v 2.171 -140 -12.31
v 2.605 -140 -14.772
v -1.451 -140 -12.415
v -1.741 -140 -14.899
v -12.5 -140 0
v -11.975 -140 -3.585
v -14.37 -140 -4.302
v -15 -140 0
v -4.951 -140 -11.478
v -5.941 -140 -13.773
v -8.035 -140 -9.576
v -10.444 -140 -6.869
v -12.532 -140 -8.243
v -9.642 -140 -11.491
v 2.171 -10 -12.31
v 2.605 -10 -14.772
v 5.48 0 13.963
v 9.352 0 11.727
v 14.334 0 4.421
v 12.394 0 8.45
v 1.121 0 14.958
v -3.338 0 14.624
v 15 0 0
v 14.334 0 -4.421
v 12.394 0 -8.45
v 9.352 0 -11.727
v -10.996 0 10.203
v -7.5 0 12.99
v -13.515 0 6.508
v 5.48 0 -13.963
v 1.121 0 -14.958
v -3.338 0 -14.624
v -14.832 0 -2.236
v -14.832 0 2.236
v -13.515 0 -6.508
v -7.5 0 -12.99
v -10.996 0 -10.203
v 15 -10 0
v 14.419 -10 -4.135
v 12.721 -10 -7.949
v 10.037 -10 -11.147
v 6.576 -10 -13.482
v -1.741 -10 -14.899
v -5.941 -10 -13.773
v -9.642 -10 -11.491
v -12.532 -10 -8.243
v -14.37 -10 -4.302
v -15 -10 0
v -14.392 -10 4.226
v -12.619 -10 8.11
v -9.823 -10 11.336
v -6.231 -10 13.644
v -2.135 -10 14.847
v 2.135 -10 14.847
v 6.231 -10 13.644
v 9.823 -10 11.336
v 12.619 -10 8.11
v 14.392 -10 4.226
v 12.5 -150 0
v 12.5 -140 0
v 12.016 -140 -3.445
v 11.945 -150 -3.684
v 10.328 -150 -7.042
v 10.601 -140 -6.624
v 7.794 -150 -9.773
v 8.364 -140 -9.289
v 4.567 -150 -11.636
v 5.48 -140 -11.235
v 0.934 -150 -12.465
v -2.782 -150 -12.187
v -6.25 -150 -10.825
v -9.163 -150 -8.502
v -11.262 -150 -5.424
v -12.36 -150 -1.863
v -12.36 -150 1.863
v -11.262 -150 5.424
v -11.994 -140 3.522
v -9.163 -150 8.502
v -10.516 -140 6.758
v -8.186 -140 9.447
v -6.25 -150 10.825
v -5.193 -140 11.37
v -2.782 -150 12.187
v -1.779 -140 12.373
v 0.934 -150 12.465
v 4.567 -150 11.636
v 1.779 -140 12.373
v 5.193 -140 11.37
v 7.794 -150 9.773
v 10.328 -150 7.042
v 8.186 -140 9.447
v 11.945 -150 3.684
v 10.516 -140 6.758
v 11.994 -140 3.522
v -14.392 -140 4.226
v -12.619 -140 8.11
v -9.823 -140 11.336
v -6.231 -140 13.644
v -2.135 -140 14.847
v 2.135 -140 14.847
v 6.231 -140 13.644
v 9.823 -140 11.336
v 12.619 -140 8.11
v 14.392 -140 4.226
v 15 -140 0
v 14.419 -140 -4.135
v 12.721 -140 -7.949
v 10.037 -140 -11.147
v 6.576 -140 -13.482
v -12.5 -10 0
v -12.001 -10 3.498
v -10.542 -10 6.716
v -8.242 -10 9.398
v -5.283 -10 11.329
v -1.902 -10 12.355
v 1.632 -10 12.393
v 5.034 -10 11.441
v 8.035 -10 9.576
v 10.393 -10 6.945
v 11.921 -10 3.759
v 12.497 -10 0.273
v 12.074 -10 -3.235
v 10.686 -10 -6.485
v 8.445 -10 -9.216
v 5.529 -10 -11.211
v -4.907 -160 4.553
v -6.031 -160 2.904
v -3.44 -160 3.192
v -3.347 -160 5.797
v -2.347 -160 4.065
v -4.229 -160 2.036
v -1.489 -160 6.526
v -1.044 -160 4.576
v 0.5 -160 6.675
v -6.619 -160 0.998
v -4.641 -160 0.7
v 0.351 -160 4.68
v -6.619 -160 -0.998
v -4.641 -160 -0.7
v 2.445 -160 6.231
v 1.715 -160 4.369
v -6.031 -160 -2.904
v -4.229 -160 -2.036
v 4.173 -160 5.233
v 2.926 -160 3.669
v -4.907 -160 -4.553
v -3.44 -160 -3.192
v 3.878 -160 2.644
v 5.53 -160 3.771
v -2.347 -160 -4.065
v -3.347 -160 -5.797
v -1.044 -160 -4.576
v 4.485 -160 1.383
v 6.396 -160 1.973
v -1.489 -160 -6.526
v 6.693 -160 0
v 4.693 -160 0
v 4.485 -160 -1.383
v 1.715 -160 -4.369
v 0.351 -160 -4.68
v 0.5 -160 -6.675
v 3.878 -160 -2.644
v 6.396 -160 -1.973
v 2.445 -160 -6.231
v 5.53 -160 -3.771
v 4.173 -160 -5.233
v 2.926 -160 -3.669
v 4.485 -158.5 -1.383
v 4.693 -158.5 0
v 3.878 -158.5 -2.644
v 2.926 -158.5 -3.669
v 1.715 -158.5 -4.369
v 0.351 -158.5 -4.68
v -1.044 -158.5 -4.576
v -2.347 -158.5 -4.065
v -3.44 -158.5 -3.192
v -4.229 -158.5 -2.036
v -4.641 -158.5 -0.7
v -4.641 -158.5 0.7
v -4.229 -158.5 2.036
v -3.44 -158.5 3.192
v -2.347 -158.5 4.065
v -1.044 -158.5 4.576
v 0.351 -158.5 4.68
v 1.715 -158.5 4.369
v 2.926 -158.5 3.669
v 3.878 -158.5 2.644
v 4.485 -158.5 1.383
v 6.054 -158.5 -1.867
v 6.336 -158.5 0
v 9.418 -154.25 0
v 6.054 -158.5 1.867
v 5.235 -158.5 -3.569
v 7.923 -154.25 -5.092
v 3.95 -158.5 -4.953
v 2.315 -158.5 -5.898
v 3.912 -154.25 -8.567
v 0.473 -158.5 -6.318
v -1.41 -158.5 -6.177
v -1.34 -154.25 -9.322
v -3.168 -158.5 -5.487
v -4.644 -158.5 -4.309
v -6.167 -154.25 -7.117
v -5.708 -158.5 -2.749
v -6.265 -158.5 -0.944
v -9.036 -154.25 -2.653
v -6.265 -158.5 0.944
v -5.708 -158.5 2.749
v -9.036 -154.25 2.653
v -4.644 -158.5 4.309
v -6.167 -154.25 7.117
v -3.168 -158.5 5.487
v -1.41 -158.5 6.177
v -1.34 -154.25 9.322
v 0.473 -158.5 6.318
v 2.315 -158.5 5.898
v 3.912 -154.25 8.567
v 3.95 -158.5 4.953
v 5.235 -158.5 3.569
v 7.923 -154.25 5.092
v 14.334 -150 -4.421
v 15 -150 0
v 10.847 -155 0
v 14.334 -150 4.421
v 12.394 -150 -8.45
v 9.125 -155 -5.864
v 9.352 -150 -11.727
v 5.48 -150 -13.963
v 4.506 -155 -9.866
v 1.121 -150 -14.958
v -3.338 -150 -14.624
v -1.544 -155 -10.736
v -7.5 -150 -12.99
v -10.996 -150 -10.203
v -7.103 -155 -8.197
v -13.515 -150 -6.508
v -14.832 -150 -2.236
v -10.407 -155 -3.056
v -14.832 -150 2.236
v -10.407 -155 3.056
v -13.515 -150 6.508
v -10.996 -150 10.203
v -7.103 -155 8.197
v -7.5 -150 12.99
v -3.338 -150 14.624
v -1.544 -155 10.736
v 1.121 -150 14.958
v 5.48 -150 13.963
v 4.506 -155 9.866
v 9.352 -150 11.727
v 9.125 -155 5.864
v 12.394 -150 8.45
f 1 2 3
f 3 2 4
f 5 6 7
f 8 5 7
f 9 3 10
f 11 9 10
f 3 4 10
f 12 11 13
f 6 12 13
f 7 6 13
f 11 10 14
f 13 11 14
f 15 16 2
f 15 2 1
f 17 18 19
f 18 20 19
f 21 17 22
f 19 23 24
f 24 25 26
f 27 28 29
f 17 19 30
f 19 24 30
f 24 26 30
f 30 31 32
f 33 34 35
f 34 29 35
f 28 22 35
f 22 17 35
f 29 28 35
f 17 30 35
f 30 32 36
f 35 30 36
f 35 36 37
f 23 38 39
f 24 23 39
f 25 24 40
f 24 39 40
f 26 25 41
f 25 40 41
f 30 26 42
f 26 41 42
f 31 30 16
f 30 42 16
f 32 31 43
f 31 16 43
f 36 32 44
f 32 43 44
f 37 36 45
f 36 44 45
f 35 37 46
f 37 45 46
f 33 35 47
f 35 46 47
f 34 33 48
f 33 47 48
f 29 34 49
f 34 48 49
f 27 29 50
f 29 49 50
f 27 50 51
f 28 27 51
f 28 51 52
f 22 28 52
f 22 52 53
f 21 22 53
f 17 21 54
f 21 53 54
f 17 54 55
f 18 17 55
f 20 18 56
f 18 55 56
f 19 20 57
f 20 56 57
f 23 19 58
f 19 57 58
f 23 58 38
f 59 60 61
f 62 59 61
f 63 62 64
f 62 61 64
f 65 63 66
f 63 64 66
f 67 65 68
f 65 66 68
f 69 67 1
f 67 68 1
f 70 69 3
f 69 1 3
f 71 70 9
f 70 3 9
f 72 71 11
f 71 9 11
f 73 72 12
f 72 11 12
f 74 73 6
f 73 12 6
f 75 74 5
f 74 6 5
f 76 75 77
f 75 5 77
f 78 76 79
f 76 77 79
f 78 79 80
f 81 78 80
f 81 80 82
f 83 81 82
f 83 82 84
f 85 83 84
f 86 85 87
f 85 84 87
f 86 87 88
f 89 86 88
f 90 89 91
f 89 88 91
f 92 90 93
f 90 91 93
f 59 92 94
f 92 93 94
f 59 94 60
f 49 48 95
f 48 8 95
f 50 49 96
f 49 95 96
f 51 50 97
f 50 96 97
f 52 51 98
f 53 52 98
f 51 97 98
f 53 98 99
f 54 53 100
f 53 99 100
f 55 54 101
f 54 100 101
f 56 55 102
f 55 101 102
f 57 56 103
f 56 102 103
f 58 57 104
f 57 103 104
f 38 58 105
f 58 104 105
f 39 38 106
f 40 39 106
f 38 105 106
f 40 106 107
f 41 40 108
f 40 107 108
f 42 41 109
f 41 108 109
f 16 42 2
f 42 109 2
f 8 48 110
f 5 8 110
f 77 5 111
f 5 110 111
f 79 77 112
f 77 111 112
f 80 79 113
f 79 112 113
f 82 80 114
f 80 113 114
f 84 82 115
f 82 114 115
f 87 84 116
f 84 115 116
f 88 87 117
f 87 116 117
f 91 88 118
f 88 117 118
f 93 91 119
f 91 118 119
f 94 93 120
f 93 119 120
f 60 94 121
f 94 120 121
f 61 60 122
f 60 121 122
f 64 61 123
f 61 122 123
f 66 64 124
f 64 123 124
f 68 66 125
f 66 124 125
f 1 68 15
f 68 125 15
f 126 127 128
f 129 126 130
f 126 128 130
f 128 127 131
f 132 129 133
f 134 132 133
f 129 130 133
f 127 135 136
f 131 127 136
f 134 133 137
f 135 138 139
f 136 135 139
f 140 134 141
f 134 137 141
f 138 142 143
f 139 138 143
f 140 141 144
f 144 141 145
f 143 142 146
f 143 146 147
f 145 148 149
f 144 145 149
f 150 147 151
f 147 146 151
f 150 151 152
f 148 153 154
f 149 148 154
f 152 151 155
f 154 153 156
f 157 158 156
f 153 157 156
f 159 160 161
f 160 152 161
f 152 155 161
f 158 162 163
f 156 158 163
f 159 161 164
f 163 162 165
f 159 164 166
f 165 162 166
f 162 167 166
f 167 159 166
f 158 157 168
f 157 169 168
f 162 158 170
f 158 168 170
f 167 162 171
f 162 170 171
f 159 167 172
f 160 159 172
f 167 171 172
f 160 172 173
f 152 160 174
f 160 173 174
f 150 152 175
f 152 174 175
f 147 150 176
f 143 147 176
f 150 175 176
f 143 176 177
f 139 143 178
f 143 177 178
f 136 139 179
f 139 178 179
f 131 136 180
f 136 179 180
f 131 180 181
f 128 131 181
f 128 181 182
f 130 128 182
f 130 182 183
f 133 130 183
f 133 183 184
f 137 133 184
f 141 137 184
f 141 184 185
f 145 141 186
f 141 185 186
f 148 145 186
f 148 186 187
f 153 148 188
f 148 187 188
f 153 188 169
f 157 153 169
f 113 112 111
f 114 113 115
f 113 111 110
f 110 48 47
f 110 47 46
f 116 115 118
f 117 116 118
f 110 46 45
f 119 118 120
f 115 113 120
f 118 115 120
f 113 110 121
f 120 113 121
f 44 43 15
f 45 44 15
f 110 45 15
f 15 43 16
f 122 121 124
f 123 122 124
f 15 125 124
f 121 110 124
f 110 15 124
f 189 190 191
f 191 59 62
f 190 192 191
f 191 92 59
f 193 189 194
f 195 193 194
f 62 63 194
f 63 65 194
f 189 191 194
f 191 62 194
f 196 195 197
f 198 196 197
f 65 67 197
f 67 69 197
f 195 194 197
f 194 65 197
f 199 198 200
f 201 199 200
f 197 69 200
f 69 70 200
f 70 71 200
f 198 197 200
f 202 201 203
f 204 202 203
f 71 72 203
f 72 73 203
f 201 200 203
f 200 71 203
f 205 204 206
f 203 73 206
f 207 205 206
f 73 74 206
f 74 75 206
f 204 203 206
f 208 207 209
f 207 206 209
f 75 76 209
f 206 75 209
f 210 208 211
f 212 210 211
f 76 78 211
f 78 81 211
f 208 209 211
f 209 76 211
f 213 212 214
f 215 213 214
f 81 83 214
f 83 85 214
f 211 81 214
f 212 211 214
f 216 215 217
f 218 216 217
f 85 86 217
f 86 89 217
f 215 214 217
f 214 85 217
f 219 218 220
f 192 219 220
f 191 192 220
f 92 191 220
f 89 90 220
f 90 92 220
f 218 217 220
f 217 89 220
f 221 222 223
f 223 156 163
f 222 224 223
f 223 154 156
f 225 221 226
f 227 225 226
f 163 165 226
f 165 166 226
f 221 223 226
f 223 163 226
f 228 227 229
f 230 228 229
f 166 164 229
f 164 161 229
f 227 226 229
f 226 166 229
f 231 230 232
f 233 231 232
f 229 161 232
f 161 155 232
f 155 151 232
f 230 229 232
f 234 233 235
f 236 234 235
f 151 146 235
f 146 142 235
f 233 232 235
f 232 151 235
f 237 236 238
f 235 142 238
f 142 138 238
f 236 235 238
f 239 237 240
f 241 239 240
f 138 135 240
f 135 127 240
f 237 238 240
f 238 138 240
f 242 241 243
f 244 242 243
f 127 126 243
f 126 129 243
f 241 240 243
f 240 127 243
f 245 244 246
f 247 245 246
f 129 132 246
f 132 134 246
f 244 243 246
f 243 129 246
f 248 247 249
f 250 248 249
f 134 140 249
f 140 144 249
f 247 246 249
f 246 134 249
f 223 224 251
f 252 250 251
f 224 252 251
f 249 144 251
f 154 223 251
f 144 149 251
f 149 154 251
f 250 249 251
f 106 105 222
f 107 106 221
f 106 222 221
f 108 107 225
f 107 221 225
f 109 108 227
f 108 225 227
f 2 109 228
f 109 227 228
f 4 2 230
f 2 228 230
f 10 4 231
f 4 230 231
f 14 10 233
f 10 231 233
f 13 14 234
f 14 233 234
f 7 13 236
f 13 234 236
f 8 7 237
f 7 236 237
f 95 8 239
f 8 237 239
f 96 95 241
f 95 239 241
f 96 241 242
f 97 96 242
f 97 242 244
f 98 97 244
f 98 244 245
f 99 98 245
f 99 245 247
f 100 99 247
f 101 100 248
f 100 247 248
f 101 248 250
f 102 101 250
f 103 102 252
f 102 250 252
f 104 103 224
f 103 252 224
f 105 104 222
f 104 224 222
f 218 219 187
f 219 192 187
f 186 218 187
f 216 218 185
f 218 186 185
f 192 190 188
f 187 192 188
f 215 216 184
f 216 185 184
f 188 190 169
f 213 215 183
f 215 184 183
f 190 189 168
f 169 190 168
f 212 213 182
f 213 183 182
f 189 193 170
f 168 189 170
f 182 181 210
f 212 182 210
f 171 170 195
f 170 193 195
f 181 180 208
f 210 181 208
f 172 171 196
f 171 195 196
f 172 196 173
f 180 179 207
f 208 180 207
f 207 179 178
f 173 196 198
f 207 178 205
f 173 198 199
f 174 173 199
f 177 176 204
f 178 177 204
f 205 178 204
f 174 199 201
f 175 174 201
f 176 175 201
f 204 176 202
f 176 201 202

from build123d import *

# Parameters (mm, degrees)
SKETCH1_W      = 15
SKETCH1_H      = 10
SKETCH1_5_W    = 2.5
SKETCH1_5_H    = 130
REVOLVE2_ANGLE = 260


with BuildPart() as part:
    # Sketch1 → Revolve1 (revolve)
    with BuildSketch(Plane.XY):
        with Locations((-7.5, -5)):
            Rectangle(SKETCH1_W, SKETCH1_H)
        Polygon((-12.5, -150), (-12.5, -140), (-15, -140), (-15, -150), (-6.693376137, -160), (-4.693376137, -160), (-4.693376137, -158.5), (-6.335585997, -158.5), align=None)
    revolve(axis=Axis((0, -943.518843805, 0), (0, 1, 0)))

    # Sketch1<5> → Revolve2 (revolve)
    with BuildSketch(Plane.XY):
        with Locations((-13.75, -75)):
            Rectangle(SKETCH1_5_W, SKETCH1_5_H)
    revolve(axis=Axis((0, -943.518843805, 0), (0, 1, 0)), revolution_arc=REVOLVE2_ANGLE)


solid = part.part
